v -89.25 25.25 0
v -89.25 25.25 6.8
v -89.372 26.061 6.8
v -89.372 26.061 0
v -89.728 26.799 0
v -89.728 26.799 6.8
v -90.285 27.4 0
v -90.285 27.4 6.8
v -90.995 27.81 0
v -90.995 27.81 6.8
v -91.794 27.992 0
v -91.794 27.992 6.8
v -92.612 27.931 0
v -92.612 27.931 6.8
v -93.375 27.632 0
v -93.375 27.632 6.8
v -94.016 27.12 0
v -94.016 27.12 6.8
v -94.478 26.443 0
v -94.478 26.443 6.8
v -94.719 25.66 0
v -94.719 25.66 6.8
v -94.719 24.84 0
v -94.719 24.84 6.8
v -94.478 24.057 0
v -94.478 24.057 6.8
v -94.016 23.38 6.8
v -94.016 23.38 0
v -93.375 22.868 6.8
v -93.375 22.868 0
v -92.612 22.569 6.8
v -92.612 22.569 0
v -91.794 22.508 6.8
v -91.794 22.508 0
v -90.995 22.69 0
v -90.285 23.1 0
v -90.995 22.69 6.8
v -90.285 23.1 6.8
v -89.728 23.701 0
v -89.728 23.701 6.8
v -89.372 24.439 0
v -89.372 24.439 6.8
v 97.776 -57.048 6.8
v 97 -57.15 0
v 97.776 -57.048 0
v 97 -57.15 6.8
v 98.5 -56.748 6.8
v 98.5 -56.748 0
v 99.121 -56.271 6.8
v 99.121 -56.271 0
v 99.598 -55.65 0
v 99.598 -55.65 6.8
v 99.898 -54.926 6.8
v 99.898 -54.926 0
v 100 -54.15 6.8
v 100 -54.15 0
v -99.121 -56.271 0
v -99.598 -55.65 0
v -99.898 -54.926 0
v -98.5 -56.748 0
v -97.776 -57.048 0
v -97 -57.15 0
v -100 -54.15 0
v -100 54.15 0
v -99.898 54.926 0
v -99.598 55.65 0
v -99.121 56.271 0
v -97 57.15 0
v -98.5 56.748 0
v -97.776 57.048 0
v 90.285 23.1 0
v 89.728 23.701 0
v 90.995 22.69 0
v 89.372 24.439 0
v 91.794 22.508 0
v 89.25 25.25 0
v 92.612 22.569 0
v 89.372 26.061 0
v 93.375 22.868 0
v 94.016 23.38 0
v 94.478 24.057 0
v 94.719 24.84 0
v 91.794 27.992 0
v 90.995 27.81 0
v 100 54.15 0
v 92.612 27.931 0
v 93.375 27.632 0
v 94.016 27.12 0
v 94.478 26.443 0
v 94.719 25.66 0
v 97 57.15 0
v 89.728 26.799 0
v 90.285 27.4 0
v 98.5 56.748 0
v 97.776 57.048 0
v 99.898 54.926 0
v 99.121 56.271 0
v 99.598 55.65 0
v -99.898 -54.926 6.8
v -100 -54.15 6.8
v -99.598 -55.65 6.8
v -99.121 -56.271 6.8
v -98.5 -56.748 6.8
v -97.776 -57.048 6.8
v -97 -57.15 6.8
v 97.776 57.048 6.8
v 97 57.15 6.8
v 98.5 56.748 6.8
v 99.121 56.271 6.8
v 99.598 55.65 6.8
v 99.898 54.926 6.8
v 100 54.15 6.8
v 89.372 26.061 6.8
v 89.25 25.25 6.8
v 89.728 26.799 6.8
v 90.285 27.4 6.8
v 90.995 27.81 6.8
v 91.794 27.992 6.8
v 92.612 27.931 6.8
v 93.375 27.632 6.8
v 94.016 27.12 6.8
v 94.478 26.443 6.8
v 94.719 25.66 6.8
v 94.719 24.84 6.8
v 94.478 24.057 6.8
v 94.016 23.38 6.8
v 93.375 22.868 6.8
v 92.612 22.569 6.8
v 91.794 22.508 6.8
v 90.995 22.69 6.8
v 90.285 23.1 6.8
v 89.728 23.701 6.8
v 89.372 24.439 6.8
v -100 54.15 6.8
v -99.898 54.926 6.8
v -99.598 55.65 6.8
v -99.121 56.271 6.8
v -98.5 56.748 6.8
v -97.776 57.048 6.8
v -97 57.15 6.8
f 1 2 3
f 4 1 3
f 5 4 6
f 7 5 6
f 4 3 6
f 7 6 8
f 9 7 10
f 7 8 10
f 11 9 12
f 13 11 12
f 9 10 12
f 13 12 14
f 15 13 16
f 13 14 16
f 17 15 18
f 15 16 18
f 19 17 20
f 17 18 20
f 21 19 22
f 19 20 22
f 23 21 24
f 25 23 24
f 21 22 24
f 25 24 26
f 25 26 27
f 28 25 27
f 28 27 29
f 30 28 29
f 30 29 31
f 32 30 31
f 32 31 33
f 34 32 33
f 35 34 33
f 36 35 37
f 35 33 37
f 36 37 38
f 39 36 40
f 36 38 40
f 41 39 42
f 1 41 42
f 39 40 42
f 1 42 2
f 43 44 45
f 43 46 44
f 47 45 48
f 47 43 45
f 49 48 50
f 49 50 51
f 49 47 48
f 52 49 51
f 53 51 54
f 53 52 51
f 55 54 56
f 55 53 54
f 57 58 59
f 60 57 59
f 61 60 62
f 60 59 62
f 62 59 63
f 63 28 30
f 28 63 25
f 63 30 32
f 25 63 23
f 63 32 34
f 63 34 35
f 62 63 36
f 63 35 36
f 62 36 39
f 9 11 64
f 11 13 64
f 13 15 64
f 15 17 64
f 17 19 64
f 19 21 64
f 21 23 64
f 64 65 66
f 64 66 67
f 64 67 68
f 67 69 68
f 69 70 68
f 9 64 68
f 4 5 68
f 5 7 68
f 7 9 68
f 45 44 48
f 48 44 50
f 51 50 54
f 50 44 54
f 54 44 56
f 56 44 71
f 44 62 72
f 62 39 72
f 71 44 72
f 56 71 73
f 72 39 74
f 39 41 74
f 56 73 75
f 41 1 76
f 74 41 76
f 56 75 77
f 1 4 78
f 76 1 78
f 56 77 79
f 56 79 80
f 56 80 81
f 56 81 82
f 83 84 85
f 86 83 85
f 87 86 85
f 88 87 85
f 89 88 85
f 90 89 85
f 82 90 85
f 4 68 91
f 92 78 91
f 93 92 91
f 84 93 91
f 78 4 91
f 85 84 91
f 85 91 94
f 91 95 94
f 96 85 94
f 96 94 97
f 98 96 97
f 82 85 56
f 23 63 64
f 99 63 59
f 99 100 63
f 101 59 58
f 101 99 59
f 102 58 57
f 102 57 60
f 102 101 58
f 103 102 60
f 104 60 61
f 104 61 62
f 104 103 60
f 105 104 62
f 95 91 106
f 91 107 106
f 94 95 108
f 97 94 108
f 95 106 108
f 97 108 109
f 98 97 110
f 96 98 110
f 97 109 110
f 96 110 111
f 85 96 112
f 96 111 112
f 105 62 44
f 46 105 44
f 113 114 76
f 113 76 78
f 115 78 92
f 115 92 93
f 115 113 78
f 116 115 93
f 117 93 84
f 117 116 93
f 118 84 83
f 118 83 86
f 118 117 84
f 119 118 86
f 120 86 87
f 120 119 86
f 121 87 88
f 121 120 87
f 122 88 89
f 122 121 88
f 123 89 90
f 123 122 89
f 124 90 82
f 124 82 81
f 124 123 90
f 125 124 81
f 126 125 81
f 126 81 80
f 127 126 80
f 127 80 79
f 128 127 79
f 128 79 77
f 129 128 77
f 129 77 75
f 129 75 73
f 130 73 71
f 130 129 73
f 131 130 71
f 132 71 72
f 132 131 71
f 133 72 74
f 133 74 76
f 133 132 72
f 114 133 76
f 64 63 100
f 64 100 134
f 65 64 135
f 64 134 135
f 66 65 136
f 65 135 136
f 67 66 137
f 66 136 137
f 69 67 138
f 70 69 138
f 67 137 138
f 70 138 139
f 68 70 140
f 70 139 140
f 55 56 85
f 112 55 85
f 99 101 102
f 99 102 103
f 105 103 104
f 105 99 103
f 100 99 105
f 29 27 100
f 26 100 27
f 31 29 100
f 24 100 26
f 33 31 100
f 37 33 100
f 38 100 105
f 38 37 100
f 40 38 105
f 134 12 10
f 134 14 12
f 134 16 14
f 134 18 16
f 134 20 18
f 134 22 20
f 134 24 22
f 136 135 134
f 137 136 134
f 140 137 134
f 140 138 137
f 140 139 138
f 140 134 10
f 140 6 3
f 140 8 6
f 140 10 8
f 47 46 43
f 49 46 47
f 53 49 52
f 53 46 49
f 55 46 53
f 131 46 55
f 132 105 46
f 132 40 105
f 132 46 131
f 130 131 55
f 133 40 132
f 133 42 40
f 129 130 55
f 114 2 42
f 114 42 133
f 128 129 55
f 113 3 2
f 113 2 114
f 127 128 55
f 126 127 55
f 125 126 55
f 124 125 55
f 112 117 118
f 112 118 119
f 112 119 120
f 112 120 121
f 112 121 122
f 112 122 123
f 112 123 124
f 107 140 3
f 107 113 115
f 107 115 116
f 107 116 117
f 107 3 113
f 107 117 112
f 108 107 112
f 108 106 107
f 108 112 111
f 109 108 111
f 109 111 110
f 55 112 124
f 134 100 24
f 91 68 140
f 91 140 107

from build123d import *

# Parameters (mm, degrees)
SKETCH1_W            = 200
SKETCH1_H            = 114.3
BOSS_EXTRUDE1_DEPTH  = 6.8
SKETCH2_R            = 2.75
CUT_EXTRUDE1_DEPTH   = 6.8
FILLET1_R            = 3
FILLET1_OF_MIRROR2_R = 3


with BuildPart() as part:
    # Sketch1 → Boss-Extrude1 (new body)
    with BuildSketch(Plane.XY):
        Rectangle(SKETCH1_W, SKETCH1_H)
    extrude(amount=BOSS_EXTRUDE1_DEPTH)

    # Sketch2 → Cut-Extrude1 (cut)
    with BuildSketch(Plane.XY.offset(6.8)):
        with Locations((-92, 25.25)):
            Circle(SKETCH2_R)
    cut_extrude1 = extrude(amount=-CUT_EXTRUDE1_DEPTH, mode=Mode.SUBTRACT)

    # Fillet1
    fillet1_edges = [part.edges().sort_by_distance(p)[0] for p in [
        (-100, 57.15, 3.4),
        (-100, -57.15, 3.4),
    ]]
    fillet(fillet1_edges, radius=FILLET1_R)

    # Mirror2: Cut-Extrude1 across plane
    add(cut_extrude1.mirror(Plane(origin=(0, 0, 0), x_dir=(0, 0, 1), z_dir=(1, 0, 0))), mode=Mode.SUBTRACT)

    # Fillet1 of Mirror2
    fillet1_of_mirror2_edges = [part.edges().sort_by_distance(p)[0] for p in [
        (100, 57.15, 3.4),
        (100, -57.15, 3.4),
    ]]
    fillet(fillet1_of_mirror2_edges, radius=FILLET1_OF_MIRROR2_R)


solid = part.part
